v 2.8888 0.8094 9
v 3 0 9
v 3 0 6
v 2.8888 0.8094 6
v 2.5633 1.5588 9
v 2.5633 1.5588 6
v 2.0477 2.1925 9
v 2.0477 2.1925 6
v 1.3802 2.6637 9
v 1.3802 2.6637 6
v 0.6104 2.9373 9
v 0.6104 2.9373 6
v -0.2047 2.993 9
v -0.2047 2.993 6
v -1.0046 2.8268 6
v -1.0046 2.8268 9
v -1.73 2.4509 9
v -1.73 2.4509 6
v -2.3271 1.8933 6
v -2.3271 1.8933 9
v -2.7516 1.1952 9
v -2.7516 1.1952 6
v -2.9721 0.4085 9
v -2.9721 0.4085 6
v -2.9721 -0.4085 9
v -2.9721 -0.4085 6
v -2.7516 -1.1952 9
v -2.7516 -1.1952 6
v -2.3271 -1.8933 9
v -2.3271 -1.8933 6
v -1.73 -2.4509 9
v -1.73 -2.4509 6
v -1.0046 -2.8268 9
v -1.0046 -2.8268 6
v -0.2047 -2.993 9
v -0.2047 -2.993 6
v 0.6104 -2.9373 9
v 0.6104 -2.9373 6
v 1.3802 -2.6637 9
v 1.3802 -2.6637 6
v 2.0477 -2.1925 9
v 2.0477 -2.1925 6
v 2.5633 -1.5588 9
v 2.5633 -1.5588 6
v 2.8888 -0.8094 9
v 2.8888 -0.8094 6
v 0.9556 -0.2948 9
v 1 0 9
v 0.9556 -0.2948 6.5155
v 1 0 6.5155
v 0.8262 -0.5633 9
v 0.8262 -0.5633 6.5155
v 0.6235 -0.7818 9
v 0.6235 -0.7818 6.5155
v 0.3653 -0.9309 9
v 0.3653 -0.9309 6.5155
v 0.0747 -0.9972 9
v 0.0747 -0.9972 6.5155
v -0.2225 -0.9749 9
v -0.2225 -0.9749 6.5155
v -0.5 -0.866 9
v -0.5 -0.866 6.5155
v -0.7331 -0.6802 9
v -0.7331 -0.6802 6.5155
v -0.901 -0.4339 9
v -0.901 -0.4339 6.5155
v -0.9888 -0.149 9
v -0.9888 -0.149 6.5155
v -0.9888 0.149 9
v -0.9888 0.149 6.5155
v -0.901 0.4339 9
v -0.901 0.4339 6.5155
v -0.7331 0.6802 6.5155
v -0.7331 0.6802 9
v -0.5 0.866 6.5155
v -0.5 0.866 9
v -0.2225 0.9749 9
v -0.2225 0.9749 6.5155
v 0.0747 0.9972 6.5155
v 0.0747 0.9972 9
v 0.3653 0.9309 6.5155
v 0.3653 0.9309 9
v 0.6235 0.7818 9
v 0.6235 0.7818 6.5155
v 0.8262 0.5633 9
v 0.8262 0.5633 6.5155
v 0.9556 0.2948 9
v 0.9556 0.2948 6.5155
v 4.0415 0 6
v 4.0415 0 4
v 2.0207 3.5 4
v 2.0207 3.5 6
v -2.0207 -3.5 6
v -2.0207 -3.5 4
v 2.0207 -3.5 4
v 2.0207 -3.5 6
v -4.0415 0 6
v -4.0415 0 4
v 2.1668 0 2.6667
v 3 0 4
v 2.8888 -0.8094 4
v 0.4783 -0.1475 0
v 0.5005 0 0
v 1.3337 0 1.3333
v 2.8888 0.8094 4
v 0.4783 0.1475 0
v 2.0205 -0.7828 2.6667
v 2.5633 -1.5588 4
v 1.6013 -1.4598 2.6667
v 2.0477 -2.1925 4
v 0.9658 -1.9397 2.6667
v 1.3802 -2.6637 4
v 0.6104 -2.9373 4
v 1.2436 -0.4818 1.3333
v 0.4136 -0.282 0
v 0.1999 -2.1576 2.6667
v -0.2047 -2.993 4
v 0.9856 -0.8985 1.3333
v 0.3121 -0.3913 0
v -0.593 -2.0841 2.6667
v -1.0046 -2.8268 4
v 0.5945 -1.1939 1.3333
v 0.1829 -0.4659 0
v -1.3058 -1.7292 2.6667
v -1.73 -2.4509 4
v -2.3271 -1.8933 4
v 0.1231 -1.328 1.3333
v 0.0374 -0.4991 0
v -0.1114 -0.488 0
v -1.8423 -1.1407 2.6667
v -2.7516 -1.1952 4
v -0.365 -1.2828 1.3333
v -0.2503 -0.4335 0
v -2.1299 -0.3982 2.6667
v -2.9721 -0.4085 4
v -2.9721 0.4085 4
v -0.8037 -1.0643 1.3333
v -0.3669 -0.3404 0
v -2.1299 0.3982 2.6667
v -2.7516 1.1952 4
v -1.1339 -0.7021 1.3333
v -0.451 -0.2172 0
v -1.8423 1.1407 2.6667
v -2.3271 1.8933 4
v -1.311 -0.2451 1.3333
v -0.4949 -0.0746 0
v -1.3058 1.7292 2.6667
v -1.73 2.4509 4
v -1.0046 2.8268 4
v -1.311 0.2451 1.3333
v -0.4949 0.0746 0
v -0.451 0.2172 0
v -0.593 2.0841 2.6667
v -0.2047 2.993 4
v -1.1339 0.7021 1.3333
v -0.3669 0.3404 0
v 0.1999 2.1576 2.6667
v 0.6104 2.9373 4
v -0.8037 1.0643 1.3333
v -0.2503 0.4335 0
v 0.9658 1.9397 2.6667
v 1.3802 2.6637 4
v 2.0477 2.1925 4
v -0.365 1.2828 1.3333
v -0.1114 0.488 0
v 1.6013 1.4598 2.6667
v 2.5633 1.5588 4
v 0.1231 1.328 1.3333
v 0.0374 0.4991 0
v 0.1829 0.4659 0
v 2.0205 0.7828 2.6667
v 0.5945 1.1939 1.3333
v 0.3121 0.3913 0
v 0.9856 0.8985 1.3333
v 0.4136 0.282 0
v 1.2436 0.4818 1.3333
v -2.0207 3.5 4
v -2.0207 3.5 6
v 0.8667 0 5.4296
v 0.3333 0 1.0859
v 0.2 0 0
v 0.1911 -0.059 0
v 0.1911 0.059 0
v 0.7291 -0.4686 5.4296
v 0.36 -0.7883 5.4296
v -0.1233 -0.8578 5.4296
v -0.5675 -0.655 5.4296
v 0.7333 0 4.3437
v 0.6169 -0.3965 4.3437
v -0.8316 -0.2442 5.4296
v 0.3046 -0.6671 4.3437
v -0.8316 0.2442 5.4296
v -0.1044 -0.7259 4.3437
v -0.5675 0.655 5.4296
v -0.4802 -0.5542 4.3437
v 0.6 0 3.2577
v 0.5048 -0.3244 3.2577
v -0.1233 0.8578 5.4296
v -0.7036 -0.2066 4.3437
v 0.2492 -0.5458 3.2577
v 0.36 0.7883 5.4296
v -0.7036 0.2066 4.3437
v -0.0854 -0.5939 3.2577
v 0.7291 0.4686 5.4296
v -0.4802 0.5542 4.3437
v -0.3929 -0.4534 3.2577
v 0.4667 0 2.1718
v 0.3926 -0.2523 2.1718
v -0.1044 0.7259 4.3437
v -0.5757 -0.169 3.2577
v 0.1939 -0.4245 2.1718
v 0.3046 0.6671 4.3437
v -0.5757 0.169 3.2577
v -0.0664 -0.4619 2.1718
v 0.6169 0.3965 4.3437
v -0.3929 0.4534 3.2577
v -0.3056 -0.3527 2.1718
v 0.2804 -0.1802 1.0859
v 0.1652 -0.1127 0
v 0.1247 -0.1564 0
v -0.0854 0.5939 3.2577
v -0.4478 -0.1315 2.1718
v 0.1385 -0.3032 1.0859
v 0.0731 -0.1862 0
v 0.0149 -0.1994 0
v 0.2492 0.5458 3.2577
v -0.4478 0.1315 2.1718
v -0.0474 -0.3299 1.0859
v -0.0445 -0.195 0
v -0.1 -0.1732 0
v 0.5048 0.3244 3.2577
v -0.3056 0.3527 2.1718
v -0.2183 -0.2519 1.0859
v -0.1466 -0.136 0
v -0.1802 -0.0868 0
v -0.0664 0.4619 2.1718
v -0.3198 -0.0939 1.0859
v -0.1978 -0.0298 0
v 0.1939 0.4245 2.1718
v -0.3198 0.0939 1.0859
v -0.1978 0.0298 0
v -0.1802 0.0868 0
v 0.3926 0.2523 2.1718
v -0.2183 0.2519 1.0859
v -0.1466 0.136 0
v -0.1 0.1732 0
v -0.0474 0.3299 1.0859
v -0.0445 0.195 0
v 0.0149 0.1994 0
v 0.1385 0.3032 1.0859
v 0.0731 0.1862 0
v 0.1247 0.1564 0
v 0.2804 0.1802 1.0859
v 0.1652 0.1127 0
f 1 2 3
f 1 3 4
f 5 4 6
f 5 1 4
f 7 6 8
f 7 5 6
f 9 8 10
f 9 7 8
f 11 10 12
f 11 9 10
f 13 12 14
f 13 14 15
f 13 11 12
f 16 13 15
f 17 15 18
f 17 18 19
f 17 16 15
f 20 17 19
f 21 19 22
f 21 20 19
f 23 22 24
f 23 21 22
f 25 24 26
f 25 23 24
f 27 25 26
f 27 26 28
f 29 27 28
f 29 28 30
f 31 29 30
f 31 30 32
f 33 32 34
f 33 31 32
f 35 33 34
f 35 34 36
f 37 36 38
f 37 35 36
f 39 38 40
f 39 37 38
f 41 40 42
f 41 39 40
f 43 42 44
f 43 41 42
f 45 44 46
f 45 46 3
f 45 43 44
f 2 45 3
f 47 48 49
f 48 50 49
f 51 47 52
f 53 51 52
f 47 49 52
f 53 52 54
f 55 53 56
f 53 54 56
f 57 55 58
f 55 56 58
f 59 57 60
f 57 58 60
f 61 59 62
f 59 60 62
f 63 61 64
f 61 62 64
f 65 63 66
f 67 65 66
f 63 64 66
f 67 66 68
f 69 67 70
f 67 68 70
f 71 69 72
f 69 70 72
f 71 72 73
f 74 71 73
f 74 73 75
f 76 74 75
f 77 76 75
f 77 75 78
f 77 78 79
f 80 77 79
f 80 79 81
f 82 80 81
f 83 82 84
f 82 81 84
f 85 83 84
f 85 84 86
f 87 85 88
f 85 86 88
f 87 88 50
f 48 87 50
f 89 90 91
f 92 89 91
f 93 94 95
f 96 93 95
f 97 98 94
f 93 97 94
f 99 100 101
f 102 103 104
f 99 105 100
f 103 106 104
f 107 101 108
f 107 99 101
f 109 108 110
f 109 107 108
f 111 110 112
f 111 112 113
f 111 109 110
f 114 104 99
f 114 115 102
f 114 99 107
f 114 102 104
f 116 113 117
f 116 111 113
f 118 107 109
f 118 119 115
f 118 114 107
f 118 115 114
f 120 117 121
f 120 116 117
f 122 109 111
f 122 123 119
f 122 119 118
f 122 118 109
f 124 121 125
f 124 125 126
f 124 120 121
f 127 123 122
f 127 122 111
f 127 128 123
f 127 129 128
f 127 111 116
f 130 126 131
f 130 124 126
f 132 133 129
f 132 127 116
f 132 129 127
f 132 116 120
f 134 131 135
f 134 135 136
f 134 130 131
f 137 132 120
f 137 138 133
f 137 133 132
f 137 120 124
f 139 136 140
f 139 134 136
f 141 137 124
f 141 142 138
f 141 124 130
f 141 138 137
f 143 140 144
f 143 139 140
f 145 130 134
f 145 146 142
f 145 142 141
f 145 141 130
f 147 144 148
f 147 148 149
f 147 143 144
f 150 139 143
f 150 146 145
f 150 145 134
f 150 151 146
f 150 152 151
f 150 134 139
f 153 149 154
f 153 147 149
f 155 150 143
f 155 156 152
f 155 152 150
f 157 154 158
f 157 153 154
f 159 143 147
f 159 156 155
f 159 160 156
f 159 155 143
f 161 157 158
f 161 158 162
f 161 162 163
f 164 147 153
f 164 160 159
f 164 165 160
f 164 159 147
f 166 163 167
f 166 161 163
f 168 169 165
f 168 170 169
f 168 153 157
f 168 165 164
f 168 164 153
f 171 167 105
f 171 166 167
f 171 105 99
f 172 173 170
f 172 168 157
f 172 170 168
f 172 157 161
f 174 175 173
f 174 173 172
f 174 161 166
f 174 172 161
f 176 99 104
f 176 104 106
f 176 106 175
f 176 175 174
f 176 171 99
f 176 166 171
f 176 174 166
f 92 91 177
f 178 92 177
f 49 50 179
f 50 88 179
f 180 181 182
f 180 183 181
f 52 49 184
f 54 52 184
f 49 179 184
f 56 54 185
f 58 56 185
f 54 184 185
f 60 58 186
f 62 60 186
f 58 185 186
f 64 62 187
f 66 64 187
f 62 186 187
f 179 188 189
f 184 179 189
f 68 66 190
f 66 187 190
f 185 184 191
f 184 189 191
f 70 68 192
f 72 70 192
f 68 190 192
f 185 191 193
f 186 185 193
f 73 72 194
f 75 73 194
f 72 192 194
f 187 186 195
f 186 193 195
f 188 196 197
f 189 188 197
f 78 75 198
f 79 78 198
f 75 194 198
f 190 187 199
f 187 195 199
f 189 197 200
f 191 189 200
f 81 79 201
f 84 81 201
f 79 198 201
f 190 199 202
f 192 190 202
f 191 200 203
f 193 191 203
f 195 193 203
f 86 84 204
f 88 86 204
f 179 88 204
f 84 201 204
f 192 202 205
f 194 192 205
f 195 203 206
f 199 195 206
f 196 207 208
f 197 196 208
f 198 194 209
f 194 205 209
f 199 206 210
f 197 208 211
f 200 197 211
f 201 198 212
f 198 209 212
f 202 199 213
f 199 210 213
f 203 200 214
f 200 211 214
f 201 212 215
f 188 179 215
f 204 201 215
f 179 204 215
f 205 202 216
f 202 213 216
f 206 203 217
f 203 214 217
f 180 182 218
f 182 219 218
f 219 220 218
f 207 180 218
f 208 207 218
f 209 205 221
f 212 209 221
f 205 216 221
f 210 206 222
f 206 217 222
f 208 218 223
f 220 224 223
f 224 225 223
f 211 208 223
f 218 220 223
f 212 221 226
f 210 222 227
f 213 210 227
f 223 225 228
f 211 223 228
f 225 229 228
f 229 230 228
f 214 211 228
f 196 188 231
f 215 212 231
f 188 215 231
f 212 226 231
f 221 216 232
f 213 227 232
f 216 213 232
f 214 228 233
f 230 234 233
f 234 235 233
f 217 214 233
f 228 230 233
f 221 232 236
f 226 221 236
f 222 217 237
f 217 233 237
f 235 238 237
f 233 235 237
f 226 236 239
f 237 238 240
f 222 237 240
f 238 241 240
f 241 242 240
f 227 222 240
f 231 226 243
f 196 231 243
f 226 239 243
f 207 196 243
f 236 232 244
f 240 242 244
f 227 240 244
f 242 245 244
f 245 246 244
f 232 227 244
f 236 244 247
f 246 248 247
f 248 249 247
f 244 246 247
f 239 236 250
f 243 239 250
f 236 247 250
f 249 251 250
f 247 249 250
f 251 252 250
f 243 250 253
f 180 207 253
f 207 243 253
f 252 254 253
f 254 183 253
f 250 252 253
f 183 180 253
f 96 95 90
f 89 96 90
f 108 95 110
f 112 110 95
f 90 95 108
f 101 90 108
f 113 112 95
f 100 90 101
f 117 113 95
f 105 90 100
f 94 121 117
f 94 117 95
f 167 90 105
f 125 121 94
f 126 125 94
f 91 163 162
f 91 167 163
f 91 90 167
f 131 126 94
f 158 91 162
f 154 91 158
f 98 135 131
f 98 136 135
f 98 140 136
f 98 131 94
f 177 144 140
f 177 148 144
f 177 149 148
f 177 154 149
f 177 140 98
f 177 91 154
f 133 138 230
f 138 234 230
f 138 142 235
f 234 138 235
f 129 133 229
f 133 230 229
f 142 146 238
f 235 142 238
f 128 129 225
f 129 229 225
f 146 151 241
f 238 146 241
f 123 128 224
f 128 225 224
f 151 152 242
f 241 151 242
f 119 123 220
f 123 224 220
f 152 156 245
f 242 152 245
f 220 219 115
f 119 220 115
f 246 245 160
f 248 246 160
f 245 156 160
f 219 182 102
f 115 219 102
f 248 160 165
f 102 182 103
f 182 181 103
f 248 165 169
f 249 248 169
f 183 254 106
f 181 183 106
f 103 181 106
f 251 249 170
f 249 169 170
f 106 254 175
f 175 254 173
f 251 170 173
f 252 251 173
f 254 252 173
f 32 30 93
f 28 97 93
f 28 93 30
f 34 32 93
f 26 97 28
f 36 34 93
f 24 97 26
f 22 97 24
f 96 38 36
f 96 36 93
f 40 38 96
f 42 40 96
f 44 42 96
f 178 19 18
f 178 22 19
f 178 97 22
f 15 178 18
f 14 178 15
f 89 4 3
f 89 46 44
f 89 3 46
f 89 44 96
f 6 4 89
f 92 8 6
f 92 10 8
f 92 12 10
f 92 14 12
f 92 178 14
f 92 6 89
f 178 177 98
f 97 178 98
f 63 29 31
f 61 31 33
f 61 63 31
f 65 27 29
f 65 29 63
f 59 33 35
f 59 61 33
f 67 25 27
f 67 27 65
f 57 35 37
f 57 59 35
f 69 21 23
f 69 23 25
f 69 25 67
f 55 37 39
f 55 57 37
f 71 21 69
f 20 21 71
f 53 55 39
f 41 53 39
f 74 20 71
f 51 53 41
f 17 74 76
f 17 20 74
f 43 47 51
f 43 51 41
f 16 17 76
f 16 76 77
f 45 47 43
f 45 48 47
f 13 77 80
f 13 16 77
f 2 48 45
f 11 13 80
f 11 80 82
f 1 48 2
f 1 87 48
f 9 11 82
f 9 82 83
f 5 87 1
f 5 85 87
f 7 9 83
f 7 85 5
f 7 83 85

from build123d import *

# Parameters (mm, degrees)
BOSS_EXTRU_1_DEPTH      = 9
ESQUISSE2_W             = 19.623971562
ESQUISSE2_H             = 15.534154535
ESQUISSE2_R             = 3
ENL_V_MAT_EXTRU_1_DEPTH = 3
ENL_V_START             = -4
ESQUISSE3_W             = 11.267201257
ESQUISSE3_H             = 13.961169169
ESQUISSE3_R             = 3
ENL_V_MAT_EXTRU_2_DEPTH = 4
CHANFREIN1_SIZE         = 4
CHANFREIN1_SIZE_2       = 2.499477408


with BuildPart() as part:
    # Esquisse1 → Boss.-Extru.1 (new body)
    with BuildSketch(Plane.XY):
        Polygon((4.041451884, 0), (2.020725942, 3.5), (-2.020725942, 3.5), (-4.041451884, 0), (-2.020725942, -3.5), (2.020725942, -3.5), align=None)
    extrude(amount=BOSS_EXTRU_1_DEPTH)

    # Esquisse2 → Enlèv. mat.-Extru.1 (cut)
    with BuildSketch(Plane.XY.offset(9)):
        with Locations((0.327116653, -1.544441398)):
            Rectangle(ESQUISSE2_W, ESQUISSE2_H)
        Circle(ESQUISSE2_R, mode=Mode.SUBTRACT)
    extrude(amount=-ENL_V_MAT_EXTRU_1_DEPTH, mode=Mode.SUBTRACT)

    # Esquisse3 → Enlèv. mat.-Extru.2 (cut)
    with BuildSketch(Plane(origin=(0, 0, 0), x_dir=(-1, 0, 0), z_dir=(0, 0, -1)).offset(ENL_V_START)):
        with Locations((0.009770186, 0.039262349)):
            Rectangle(ESQUISSE3_W, ESQUISSE3_H)
        with Locations(Location((0, 0, 0), (0, 0, 180))):
            Circle(ESQUISSE3_R, mode=Mode.SUBTRACT)
    extrude(amount=ENL_V_MAT_EXTRU_2_DEPTH, mode=Mode.SUBTRACT)

    # Chanfrein1
    # the kernel refuses this chamfer: 4, 2.499477408 mm, written as the material it takes off along each edge
    with BuildSketch(Plane(origin=(0, 0, 0), x_dir=(1, 0, 0), z_dir=(0, 1, 0))) as chanfrein1_piece_1_section:
        Polygon((3, -CHANFREIN1_SIZE), (3 - CHANFREIN1_SIZE_2, 0), (3, 0), align=None)
    chanfrein1_piece_1 = revolve(axis=Axis((0, 0, 0), (0, 0, -1)), mode=Mode.PRIVATE)
    chanfrein1_piece_1 = split(chanfrein1_piece_1, bisect_by=Plane(origin=(-1.744026904, 0, 4), z_dir=(0, 0, -1)), keep=Keep.TOP, mode=Mode.PRIVATE)
    add(chanfrein1_piece_1, mode=Mode.SUBTRACT)

    # Esquisse4 → Enlèvement de matière-Révolution1 (revolve, cut)
    with BuildSketch(Plane(origin=(0, 0, 0), x_dir=(1, 0, 0), z_dir=(0, 1, 0))):
        Polygon((0, -9), (1, -9), (1, -6.515477142), (0.2, 0), (0, 0), align=None)
    revolve(axis=Axis((0, 0, 10.381605157), (0, 0, -1)), mode=Mode.SUBTRACT)


solid = part.part
